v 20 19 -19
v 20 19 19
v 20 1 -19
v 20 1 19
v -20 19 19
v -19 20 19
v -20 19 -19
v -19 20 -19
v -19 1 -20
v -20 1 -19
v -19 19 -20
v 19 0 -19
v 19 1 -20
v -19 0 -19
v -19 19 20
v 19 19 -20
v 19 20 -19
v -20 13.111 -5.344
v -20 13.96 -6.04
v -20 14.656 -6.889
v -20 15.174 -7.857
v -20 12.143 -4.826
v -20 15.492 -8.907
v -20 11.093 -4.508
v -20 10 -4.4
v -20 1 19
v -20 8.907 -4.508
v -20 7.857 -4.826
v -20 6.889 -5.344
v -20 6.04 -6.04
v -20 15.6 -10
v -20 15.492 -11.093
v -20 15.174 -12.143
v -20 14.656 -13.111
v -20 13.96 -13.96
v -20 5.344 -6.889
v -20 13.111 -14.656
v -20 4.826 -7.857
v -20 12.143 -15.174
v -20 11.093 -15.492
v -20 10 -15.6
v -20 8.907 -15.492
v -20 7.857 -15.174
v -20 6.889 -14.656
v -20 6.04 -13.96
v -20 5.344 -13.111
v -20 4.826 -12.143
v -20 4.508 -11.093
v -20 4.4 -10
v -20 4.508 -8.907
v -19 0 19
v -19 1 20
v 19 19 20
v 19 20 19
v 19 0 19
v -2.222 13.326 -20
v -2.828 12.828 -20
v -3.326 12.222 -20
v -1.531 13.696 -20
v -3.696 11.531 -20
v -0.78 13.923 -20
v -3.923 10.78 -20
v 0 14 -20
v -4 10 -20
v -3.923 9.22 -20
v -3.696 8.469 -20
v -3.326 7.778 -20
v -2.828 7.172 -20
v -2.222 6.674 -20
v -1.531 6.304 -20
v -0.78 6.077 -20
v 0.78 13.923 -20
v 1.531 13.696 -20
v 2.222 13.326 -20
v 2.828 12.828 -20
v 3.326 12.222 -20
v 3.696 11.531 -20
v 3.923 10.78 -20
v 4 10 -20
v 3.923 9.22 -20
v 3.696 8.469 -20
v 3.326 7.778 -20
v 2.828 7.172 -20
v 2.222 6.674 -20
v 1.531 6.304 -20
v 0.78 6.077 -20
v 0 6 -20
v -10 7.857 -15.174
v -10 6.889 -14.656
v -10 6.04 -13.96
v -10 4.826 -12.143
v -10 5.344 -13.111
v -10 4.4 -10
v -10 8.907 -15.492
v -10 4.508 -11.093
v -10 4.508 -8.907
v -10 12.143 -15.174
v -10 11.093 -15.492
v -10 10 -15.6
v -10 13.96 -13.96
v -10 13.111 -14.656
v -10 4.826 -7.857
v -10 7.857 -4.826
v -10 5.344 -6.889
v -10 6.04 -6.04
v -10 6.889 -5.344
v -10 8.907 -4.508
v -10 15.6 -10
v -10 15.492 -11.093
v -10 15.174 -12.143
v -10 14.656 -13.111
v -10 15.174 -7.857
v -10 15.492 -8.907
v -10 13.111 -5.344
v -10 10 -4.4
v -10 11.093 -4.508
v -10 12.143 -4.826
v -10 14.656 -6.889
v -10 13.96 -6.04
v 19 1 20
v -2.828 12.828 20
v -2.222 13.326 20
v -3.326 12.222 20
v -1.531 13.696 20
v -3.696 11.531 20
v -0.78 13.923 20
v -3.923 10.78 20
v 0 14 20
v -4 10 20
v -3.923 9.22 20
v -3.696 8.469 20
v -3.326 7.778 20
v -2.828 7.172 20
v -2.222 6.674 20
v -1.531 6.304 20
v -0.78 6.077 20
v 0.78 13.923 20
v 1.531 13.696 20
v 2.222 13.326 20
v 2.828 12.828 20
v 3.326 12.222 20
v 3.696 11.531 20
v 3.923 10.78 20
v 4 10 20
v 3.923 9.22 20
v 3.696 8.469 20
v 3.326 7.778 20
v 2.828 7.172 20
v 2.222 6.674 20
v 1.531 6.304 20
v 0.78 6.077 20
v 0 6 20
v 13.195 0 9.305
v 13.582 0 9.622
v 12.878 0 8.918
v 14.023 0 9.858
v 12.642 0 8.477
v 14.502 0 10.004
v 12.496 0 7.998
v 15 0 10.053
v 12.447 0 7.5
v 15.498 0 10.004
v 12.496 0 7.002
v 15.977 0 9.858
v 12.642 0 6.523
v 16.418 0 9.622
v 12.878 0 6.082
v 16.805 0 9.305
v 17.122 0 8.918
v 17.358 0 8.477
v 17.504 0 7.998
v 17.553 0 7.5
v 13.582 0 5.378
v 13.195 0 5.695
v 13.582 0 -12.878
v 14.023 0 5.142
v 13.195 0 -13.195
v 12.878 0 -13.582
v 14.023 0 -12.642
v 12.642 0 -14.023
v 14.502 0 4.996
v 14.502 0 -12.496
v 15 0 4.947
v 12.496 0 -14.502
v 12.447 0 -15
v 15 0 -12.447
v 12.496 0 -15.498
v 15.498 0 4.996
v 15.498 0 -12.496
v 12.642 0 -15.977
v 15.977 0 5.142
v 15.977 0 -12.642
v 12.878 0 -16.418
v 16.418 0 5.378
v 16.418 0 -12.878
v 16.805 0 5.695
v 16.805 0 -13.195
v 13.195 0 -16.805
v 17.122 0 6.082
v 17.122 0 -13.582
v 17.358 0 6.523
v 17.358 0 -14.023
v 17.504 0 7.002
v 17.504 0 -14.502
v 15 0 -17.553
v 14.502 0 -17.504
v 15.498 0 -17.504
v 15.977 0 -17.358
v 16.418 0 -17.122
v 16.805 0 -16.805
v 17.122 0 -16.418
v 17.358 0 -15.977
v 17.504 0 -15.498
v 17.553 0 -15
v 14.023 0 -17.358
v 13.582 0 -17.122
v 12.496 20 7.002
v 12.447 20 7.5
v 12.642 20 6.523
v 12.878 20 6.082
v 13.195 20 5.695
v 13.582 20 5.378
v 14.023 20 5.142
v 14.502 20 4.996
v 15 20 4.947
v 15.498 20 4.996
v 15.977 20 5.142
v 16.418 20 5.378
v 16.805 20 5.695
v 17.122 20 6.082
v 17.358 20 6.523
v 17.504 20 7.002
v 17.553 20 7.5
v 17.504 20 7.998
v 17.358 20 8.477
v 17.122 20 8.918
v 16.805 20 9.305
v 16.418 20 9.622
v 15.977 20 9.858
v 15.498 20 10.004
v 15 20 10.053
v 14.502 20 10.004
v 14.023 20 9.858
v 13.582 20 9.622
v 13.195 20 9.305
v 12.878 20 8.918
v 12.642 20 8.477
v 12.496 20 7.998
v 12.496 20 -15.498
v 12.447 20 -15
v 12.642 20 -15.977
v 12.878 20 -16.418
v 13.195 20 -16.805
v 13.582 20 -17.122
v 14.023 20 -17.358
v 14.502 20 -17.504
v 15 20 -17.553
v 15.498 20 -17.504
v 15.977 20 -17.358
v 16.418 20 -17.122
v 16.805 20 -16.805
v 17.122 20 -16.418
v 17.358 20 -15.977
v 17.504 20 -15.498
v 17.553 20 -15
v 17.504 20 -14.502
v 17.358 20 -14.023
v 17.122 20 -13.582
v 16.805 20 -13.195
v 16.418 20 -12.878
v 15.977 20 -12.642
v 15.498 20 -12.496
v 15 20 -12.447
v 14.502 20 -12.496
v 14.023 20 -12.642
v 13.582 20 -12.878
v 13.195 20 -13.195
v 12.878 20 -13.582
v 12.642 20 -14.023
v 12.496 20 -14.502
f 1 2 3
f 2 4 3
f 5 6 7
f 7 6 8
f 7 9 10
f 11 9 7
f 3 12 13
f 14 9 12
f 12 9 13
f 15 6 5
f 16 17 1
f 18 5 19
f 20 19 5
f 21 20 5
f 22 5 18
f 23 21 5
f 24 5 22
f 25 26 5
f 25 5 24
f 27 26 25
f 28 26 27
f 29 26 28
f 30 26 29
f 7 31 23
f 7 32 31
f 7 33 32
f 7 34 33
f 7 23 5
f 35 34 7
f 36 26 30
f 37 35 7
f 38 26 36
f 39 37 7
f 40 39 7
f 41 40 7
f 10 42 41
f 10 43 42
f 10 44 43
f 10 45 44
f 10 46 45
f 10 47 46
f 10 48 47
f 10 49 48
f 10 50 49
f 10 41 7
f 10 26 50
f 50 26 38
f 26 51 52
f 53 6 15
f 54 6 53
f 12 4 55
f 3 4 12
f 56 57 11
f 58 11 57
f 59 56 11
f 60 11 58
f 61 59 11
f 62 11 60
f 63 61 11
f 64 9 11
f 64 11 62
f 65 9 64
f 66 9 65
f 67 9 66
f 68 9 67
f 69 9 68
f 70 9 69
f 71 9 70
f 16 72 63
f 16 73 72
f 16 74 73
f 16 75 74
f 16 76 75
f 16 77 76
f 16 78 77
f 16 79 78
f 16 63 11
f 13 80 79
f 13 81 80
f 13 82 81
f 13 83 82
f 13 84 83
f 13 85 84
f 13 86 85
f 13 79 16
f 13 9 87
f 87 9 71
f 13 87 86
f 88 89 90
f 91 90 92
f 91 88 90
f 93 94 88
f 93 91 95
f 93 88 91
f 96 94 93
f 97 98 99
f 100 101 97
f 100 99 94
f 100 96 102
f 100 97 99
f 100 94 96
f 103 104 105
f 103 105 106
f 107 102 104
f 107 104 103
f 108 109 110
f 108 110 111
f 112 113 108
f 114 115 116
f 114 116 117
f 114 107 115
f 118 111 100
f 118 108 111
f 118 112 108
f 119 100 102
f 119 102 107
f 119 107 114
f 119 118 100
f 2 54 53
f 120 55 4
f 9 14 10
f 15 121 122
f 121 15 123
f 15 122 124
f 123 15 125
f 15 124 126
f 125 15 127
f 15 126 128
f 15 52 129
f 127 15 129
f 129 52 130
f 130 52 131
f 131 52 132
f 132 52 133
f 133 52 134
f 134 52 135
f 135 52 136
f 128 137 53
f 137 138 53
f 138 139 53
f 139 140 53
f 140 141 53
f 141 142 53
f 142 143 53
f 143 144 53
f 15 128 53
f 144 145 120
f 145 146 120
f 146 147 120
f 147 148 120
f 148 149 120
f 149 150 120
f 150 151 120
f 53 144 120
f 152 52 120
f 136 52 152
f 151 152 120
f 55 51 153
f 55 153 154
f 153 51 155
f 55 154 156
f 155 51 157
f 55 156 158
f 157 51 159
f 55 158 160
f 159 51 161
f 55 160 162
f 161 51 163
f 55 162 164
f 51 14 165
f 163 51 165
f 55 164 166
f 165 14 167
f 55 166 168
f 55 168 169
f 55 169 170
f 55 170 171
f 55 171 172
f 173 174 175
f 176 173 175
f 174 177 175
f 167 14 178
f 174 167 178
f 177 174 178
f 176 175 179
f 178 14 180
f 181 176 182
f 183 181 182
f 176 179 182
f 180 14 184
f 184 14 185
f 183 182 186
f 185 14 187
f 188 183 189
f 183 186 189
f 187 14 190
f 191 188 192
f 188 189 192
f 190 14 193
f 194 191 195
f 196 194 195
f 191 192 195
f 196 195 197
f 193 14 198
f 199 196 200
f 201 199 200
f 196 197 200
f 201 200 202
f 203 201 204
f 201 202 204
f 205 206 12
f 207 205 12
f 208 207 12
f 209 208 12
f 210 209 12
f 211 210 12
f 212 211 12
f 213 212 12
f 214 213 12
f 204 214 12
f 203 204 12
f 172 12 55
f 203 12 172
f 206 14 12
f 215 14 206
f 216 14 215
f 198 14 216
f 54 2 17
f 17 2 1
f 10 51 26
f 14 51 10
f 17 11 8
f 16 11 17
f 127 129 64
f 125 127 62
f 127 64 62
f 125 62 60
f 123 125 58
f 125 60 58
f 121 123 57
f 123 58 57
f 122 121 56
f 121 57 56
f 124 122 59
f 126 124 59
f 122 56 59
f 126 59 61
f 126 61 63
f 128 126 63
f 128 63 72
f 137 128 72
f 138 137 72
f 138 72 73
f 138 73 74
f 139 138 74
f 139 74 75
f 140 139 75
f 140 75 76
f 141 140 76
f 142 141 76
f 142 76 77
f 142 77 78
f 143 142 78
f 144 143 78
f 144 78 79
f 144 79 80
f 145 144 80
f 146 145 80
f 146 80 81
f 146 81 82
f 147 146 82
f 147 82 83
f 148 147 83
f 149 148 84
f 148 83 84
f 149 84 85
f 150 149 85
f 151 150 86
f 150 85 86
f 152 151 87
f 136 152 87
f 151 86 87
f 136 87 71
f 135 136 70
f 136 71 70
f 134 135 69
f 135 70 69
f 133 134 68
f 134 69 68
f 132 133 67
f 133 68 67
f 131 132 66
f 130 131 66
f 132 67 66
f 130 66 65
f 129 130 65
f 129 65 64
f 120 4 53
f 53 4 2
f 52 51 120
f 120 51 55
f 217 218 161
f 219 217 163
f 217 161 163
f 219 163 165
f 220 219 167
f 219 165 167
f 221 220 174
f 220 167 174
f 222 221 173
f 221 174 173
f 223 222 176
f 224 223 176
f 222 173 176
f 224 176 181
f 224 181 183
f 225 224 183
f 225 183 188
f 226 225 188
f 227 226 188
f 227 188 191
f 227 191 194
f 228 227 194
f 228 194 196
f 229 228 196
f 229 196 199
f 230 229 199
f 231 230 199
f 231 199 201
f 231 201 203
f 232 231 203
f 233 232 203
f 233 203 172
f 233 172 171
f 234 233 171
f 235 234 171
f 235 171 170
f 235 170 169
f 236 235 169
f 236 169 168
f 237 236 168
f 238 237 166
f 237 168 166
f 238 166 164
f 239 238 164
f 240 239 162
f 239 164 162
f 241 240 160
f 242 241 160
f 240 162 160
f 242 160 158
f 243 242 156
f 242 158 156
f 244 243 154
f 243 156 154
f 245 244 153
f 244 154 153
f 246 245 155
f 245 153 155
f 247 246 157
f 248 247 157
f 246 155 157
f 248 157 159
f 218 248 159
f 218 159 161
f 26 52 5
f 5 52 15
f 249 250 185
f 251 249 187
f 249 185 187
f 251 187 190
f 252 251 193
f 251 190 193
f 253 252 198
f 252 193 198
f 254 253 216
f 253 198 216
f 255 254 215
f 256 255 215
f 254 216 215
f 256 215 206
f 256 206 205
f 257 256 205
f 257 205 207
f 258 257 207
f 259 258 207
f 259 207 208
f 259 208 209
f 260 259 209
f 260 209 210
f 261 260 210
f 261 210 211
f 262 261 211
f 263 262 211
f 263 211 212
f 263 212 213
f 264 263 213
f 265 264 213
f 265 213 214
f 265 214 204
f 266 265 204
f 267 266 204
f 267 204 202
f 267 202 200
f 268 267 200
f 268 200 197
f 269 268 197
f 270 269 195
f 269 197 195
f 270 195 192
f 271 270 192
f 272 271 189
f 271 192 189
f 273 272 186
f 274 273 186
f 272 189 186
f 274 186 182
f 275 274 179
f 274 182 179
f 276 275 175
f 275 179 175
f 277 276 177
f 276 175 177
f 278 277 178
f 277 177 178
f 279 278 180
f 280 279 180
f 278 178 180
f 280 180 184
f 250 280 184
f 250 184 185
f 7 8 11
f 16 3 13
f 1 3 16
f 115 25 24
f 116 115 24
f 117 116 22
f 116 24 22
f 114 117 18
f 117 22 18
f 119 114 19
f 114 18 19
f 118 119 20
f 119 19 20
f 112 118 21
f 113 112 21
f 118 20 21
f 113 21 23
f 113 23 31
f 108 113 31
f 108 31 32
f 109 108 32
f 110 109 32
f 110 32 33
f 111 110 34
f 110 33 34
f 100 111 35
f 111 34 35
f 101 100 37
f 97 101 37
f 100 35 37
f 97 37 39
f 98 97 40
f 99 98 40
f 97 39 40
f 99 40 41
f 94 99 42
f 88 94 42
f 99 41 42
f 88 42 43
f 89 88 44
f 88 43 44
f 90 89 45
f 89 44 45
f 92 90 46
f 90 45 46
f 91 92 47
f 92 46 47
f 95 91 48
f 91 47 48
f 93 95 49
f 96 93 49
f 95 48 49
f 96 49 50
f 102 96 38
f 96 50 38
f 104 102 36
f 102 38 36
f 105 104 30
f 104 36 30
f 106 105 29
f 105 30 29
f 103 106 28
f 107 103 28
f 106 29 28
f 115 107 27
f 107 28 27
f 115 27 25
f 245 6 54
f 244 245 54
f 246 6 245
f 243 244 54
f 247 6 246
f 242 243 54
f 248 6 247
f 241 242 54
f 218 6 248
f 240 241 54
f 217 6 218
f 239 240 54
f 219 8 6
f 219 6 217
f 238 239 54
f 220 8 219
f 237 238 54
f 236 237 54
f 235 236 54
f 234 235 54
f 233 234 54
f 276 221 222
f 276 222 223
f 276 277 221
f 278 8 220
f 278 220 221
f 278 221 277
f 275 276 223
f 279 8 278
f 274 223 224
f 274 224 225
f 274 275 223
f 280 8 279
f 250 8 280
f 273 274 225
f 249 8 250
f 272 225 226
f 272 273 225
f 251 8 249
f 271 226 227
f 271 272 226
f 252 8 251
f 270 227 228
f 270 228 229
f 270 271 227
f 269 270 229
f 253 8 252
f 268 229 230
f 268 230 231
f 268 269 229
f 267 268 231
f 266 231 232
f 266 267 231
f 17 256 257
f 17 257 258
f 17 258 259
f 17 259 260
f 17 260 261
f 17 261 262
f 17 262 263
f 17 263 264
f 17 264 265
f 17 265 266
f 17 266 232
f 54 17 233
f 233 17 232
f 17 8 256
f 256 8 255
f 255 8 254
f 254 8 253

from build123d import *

# Parameters (mm, degrees)
SKETCH1_W               = 40
SKETCH1_H               = 40
BOSS_EXTRUDE1_DEPTH     = 20
SKETCH2_R               = 5.6
CUT_EXTRUDE1_DEPTH      = 10
CHAMFER1_SIZE           = 1
F_1_4_20_TAPPED_HOLE1_D = 5.1054
SKETCH5_R               = 4
CUT_EXTRUDE2_DEPTH      = 41


with BuildPart() as part:
    # Sketch1 → Boss-Extrude1 (new body)
    with BuildSketch(Plane(origin=(0, 0, 0), x_dir=(1, 0, 0), z_dir=(0, 1, 0))):
        Rectangle(SKETCH1_W, SKETCH1_H)
    extrude(amount=BOSS_EXTRUDE1_DEPTH)

    # Sketch2 → Cut-Extrude1 (cut)
    with BuildSketch(Plane.ZY.offset(20)):
        with Locations((-10, 10)):
            Circle(SKETCH2_R)
    extrude(amount=-CUT_EXTRUDE1_DEPTH, mode=Mode.SUBTRACT)

    # Chamfer1
    chamfer1_edges = [part.edges().sort_by_distance(p)[0] for p in [
        (-20, 20, 0),
        (0, 20, 20),
        (20, 20, 0),
        (0, 0, 20),
        (-20, 0, 0),
        (0, 0, -20),
        (20, 0, 0),
        (0, 20, -20),
        (20, 10, 20),
        (-20, 10, 20),
        (-20, 10, -20),
        (20, 10, -20),
    ]]
    chamfer(chamfer1_edges, length=CHAMFER1_SIZE)

    # 1/4-20 Tapped Hole1 (through all)
    with Locations(Plane(origin=(0, 20, 0), x_dir=(1, 0, 0), z_dir=(0, 1, 0))):
        with Locations((15, -7.5), (15, 15)):
            Hole(F_1_4_20_TAPPED_HOLE1_D / 2)

    # Sketch5 → Cut-Extrude2 (cut, through all)
    with BuildSketch(Plane(origin=(0, 0, -20), x_dir=(-1, 0, 0), z_dir=(0, 0, -1))):
        with Locations((0, 10)):
            Circle(SKETCH5_R)
    extrude(amount=-CUT_EXTRUDE2_DEPTH, mode=Mode.SUBTRACT)


solid = part.part
